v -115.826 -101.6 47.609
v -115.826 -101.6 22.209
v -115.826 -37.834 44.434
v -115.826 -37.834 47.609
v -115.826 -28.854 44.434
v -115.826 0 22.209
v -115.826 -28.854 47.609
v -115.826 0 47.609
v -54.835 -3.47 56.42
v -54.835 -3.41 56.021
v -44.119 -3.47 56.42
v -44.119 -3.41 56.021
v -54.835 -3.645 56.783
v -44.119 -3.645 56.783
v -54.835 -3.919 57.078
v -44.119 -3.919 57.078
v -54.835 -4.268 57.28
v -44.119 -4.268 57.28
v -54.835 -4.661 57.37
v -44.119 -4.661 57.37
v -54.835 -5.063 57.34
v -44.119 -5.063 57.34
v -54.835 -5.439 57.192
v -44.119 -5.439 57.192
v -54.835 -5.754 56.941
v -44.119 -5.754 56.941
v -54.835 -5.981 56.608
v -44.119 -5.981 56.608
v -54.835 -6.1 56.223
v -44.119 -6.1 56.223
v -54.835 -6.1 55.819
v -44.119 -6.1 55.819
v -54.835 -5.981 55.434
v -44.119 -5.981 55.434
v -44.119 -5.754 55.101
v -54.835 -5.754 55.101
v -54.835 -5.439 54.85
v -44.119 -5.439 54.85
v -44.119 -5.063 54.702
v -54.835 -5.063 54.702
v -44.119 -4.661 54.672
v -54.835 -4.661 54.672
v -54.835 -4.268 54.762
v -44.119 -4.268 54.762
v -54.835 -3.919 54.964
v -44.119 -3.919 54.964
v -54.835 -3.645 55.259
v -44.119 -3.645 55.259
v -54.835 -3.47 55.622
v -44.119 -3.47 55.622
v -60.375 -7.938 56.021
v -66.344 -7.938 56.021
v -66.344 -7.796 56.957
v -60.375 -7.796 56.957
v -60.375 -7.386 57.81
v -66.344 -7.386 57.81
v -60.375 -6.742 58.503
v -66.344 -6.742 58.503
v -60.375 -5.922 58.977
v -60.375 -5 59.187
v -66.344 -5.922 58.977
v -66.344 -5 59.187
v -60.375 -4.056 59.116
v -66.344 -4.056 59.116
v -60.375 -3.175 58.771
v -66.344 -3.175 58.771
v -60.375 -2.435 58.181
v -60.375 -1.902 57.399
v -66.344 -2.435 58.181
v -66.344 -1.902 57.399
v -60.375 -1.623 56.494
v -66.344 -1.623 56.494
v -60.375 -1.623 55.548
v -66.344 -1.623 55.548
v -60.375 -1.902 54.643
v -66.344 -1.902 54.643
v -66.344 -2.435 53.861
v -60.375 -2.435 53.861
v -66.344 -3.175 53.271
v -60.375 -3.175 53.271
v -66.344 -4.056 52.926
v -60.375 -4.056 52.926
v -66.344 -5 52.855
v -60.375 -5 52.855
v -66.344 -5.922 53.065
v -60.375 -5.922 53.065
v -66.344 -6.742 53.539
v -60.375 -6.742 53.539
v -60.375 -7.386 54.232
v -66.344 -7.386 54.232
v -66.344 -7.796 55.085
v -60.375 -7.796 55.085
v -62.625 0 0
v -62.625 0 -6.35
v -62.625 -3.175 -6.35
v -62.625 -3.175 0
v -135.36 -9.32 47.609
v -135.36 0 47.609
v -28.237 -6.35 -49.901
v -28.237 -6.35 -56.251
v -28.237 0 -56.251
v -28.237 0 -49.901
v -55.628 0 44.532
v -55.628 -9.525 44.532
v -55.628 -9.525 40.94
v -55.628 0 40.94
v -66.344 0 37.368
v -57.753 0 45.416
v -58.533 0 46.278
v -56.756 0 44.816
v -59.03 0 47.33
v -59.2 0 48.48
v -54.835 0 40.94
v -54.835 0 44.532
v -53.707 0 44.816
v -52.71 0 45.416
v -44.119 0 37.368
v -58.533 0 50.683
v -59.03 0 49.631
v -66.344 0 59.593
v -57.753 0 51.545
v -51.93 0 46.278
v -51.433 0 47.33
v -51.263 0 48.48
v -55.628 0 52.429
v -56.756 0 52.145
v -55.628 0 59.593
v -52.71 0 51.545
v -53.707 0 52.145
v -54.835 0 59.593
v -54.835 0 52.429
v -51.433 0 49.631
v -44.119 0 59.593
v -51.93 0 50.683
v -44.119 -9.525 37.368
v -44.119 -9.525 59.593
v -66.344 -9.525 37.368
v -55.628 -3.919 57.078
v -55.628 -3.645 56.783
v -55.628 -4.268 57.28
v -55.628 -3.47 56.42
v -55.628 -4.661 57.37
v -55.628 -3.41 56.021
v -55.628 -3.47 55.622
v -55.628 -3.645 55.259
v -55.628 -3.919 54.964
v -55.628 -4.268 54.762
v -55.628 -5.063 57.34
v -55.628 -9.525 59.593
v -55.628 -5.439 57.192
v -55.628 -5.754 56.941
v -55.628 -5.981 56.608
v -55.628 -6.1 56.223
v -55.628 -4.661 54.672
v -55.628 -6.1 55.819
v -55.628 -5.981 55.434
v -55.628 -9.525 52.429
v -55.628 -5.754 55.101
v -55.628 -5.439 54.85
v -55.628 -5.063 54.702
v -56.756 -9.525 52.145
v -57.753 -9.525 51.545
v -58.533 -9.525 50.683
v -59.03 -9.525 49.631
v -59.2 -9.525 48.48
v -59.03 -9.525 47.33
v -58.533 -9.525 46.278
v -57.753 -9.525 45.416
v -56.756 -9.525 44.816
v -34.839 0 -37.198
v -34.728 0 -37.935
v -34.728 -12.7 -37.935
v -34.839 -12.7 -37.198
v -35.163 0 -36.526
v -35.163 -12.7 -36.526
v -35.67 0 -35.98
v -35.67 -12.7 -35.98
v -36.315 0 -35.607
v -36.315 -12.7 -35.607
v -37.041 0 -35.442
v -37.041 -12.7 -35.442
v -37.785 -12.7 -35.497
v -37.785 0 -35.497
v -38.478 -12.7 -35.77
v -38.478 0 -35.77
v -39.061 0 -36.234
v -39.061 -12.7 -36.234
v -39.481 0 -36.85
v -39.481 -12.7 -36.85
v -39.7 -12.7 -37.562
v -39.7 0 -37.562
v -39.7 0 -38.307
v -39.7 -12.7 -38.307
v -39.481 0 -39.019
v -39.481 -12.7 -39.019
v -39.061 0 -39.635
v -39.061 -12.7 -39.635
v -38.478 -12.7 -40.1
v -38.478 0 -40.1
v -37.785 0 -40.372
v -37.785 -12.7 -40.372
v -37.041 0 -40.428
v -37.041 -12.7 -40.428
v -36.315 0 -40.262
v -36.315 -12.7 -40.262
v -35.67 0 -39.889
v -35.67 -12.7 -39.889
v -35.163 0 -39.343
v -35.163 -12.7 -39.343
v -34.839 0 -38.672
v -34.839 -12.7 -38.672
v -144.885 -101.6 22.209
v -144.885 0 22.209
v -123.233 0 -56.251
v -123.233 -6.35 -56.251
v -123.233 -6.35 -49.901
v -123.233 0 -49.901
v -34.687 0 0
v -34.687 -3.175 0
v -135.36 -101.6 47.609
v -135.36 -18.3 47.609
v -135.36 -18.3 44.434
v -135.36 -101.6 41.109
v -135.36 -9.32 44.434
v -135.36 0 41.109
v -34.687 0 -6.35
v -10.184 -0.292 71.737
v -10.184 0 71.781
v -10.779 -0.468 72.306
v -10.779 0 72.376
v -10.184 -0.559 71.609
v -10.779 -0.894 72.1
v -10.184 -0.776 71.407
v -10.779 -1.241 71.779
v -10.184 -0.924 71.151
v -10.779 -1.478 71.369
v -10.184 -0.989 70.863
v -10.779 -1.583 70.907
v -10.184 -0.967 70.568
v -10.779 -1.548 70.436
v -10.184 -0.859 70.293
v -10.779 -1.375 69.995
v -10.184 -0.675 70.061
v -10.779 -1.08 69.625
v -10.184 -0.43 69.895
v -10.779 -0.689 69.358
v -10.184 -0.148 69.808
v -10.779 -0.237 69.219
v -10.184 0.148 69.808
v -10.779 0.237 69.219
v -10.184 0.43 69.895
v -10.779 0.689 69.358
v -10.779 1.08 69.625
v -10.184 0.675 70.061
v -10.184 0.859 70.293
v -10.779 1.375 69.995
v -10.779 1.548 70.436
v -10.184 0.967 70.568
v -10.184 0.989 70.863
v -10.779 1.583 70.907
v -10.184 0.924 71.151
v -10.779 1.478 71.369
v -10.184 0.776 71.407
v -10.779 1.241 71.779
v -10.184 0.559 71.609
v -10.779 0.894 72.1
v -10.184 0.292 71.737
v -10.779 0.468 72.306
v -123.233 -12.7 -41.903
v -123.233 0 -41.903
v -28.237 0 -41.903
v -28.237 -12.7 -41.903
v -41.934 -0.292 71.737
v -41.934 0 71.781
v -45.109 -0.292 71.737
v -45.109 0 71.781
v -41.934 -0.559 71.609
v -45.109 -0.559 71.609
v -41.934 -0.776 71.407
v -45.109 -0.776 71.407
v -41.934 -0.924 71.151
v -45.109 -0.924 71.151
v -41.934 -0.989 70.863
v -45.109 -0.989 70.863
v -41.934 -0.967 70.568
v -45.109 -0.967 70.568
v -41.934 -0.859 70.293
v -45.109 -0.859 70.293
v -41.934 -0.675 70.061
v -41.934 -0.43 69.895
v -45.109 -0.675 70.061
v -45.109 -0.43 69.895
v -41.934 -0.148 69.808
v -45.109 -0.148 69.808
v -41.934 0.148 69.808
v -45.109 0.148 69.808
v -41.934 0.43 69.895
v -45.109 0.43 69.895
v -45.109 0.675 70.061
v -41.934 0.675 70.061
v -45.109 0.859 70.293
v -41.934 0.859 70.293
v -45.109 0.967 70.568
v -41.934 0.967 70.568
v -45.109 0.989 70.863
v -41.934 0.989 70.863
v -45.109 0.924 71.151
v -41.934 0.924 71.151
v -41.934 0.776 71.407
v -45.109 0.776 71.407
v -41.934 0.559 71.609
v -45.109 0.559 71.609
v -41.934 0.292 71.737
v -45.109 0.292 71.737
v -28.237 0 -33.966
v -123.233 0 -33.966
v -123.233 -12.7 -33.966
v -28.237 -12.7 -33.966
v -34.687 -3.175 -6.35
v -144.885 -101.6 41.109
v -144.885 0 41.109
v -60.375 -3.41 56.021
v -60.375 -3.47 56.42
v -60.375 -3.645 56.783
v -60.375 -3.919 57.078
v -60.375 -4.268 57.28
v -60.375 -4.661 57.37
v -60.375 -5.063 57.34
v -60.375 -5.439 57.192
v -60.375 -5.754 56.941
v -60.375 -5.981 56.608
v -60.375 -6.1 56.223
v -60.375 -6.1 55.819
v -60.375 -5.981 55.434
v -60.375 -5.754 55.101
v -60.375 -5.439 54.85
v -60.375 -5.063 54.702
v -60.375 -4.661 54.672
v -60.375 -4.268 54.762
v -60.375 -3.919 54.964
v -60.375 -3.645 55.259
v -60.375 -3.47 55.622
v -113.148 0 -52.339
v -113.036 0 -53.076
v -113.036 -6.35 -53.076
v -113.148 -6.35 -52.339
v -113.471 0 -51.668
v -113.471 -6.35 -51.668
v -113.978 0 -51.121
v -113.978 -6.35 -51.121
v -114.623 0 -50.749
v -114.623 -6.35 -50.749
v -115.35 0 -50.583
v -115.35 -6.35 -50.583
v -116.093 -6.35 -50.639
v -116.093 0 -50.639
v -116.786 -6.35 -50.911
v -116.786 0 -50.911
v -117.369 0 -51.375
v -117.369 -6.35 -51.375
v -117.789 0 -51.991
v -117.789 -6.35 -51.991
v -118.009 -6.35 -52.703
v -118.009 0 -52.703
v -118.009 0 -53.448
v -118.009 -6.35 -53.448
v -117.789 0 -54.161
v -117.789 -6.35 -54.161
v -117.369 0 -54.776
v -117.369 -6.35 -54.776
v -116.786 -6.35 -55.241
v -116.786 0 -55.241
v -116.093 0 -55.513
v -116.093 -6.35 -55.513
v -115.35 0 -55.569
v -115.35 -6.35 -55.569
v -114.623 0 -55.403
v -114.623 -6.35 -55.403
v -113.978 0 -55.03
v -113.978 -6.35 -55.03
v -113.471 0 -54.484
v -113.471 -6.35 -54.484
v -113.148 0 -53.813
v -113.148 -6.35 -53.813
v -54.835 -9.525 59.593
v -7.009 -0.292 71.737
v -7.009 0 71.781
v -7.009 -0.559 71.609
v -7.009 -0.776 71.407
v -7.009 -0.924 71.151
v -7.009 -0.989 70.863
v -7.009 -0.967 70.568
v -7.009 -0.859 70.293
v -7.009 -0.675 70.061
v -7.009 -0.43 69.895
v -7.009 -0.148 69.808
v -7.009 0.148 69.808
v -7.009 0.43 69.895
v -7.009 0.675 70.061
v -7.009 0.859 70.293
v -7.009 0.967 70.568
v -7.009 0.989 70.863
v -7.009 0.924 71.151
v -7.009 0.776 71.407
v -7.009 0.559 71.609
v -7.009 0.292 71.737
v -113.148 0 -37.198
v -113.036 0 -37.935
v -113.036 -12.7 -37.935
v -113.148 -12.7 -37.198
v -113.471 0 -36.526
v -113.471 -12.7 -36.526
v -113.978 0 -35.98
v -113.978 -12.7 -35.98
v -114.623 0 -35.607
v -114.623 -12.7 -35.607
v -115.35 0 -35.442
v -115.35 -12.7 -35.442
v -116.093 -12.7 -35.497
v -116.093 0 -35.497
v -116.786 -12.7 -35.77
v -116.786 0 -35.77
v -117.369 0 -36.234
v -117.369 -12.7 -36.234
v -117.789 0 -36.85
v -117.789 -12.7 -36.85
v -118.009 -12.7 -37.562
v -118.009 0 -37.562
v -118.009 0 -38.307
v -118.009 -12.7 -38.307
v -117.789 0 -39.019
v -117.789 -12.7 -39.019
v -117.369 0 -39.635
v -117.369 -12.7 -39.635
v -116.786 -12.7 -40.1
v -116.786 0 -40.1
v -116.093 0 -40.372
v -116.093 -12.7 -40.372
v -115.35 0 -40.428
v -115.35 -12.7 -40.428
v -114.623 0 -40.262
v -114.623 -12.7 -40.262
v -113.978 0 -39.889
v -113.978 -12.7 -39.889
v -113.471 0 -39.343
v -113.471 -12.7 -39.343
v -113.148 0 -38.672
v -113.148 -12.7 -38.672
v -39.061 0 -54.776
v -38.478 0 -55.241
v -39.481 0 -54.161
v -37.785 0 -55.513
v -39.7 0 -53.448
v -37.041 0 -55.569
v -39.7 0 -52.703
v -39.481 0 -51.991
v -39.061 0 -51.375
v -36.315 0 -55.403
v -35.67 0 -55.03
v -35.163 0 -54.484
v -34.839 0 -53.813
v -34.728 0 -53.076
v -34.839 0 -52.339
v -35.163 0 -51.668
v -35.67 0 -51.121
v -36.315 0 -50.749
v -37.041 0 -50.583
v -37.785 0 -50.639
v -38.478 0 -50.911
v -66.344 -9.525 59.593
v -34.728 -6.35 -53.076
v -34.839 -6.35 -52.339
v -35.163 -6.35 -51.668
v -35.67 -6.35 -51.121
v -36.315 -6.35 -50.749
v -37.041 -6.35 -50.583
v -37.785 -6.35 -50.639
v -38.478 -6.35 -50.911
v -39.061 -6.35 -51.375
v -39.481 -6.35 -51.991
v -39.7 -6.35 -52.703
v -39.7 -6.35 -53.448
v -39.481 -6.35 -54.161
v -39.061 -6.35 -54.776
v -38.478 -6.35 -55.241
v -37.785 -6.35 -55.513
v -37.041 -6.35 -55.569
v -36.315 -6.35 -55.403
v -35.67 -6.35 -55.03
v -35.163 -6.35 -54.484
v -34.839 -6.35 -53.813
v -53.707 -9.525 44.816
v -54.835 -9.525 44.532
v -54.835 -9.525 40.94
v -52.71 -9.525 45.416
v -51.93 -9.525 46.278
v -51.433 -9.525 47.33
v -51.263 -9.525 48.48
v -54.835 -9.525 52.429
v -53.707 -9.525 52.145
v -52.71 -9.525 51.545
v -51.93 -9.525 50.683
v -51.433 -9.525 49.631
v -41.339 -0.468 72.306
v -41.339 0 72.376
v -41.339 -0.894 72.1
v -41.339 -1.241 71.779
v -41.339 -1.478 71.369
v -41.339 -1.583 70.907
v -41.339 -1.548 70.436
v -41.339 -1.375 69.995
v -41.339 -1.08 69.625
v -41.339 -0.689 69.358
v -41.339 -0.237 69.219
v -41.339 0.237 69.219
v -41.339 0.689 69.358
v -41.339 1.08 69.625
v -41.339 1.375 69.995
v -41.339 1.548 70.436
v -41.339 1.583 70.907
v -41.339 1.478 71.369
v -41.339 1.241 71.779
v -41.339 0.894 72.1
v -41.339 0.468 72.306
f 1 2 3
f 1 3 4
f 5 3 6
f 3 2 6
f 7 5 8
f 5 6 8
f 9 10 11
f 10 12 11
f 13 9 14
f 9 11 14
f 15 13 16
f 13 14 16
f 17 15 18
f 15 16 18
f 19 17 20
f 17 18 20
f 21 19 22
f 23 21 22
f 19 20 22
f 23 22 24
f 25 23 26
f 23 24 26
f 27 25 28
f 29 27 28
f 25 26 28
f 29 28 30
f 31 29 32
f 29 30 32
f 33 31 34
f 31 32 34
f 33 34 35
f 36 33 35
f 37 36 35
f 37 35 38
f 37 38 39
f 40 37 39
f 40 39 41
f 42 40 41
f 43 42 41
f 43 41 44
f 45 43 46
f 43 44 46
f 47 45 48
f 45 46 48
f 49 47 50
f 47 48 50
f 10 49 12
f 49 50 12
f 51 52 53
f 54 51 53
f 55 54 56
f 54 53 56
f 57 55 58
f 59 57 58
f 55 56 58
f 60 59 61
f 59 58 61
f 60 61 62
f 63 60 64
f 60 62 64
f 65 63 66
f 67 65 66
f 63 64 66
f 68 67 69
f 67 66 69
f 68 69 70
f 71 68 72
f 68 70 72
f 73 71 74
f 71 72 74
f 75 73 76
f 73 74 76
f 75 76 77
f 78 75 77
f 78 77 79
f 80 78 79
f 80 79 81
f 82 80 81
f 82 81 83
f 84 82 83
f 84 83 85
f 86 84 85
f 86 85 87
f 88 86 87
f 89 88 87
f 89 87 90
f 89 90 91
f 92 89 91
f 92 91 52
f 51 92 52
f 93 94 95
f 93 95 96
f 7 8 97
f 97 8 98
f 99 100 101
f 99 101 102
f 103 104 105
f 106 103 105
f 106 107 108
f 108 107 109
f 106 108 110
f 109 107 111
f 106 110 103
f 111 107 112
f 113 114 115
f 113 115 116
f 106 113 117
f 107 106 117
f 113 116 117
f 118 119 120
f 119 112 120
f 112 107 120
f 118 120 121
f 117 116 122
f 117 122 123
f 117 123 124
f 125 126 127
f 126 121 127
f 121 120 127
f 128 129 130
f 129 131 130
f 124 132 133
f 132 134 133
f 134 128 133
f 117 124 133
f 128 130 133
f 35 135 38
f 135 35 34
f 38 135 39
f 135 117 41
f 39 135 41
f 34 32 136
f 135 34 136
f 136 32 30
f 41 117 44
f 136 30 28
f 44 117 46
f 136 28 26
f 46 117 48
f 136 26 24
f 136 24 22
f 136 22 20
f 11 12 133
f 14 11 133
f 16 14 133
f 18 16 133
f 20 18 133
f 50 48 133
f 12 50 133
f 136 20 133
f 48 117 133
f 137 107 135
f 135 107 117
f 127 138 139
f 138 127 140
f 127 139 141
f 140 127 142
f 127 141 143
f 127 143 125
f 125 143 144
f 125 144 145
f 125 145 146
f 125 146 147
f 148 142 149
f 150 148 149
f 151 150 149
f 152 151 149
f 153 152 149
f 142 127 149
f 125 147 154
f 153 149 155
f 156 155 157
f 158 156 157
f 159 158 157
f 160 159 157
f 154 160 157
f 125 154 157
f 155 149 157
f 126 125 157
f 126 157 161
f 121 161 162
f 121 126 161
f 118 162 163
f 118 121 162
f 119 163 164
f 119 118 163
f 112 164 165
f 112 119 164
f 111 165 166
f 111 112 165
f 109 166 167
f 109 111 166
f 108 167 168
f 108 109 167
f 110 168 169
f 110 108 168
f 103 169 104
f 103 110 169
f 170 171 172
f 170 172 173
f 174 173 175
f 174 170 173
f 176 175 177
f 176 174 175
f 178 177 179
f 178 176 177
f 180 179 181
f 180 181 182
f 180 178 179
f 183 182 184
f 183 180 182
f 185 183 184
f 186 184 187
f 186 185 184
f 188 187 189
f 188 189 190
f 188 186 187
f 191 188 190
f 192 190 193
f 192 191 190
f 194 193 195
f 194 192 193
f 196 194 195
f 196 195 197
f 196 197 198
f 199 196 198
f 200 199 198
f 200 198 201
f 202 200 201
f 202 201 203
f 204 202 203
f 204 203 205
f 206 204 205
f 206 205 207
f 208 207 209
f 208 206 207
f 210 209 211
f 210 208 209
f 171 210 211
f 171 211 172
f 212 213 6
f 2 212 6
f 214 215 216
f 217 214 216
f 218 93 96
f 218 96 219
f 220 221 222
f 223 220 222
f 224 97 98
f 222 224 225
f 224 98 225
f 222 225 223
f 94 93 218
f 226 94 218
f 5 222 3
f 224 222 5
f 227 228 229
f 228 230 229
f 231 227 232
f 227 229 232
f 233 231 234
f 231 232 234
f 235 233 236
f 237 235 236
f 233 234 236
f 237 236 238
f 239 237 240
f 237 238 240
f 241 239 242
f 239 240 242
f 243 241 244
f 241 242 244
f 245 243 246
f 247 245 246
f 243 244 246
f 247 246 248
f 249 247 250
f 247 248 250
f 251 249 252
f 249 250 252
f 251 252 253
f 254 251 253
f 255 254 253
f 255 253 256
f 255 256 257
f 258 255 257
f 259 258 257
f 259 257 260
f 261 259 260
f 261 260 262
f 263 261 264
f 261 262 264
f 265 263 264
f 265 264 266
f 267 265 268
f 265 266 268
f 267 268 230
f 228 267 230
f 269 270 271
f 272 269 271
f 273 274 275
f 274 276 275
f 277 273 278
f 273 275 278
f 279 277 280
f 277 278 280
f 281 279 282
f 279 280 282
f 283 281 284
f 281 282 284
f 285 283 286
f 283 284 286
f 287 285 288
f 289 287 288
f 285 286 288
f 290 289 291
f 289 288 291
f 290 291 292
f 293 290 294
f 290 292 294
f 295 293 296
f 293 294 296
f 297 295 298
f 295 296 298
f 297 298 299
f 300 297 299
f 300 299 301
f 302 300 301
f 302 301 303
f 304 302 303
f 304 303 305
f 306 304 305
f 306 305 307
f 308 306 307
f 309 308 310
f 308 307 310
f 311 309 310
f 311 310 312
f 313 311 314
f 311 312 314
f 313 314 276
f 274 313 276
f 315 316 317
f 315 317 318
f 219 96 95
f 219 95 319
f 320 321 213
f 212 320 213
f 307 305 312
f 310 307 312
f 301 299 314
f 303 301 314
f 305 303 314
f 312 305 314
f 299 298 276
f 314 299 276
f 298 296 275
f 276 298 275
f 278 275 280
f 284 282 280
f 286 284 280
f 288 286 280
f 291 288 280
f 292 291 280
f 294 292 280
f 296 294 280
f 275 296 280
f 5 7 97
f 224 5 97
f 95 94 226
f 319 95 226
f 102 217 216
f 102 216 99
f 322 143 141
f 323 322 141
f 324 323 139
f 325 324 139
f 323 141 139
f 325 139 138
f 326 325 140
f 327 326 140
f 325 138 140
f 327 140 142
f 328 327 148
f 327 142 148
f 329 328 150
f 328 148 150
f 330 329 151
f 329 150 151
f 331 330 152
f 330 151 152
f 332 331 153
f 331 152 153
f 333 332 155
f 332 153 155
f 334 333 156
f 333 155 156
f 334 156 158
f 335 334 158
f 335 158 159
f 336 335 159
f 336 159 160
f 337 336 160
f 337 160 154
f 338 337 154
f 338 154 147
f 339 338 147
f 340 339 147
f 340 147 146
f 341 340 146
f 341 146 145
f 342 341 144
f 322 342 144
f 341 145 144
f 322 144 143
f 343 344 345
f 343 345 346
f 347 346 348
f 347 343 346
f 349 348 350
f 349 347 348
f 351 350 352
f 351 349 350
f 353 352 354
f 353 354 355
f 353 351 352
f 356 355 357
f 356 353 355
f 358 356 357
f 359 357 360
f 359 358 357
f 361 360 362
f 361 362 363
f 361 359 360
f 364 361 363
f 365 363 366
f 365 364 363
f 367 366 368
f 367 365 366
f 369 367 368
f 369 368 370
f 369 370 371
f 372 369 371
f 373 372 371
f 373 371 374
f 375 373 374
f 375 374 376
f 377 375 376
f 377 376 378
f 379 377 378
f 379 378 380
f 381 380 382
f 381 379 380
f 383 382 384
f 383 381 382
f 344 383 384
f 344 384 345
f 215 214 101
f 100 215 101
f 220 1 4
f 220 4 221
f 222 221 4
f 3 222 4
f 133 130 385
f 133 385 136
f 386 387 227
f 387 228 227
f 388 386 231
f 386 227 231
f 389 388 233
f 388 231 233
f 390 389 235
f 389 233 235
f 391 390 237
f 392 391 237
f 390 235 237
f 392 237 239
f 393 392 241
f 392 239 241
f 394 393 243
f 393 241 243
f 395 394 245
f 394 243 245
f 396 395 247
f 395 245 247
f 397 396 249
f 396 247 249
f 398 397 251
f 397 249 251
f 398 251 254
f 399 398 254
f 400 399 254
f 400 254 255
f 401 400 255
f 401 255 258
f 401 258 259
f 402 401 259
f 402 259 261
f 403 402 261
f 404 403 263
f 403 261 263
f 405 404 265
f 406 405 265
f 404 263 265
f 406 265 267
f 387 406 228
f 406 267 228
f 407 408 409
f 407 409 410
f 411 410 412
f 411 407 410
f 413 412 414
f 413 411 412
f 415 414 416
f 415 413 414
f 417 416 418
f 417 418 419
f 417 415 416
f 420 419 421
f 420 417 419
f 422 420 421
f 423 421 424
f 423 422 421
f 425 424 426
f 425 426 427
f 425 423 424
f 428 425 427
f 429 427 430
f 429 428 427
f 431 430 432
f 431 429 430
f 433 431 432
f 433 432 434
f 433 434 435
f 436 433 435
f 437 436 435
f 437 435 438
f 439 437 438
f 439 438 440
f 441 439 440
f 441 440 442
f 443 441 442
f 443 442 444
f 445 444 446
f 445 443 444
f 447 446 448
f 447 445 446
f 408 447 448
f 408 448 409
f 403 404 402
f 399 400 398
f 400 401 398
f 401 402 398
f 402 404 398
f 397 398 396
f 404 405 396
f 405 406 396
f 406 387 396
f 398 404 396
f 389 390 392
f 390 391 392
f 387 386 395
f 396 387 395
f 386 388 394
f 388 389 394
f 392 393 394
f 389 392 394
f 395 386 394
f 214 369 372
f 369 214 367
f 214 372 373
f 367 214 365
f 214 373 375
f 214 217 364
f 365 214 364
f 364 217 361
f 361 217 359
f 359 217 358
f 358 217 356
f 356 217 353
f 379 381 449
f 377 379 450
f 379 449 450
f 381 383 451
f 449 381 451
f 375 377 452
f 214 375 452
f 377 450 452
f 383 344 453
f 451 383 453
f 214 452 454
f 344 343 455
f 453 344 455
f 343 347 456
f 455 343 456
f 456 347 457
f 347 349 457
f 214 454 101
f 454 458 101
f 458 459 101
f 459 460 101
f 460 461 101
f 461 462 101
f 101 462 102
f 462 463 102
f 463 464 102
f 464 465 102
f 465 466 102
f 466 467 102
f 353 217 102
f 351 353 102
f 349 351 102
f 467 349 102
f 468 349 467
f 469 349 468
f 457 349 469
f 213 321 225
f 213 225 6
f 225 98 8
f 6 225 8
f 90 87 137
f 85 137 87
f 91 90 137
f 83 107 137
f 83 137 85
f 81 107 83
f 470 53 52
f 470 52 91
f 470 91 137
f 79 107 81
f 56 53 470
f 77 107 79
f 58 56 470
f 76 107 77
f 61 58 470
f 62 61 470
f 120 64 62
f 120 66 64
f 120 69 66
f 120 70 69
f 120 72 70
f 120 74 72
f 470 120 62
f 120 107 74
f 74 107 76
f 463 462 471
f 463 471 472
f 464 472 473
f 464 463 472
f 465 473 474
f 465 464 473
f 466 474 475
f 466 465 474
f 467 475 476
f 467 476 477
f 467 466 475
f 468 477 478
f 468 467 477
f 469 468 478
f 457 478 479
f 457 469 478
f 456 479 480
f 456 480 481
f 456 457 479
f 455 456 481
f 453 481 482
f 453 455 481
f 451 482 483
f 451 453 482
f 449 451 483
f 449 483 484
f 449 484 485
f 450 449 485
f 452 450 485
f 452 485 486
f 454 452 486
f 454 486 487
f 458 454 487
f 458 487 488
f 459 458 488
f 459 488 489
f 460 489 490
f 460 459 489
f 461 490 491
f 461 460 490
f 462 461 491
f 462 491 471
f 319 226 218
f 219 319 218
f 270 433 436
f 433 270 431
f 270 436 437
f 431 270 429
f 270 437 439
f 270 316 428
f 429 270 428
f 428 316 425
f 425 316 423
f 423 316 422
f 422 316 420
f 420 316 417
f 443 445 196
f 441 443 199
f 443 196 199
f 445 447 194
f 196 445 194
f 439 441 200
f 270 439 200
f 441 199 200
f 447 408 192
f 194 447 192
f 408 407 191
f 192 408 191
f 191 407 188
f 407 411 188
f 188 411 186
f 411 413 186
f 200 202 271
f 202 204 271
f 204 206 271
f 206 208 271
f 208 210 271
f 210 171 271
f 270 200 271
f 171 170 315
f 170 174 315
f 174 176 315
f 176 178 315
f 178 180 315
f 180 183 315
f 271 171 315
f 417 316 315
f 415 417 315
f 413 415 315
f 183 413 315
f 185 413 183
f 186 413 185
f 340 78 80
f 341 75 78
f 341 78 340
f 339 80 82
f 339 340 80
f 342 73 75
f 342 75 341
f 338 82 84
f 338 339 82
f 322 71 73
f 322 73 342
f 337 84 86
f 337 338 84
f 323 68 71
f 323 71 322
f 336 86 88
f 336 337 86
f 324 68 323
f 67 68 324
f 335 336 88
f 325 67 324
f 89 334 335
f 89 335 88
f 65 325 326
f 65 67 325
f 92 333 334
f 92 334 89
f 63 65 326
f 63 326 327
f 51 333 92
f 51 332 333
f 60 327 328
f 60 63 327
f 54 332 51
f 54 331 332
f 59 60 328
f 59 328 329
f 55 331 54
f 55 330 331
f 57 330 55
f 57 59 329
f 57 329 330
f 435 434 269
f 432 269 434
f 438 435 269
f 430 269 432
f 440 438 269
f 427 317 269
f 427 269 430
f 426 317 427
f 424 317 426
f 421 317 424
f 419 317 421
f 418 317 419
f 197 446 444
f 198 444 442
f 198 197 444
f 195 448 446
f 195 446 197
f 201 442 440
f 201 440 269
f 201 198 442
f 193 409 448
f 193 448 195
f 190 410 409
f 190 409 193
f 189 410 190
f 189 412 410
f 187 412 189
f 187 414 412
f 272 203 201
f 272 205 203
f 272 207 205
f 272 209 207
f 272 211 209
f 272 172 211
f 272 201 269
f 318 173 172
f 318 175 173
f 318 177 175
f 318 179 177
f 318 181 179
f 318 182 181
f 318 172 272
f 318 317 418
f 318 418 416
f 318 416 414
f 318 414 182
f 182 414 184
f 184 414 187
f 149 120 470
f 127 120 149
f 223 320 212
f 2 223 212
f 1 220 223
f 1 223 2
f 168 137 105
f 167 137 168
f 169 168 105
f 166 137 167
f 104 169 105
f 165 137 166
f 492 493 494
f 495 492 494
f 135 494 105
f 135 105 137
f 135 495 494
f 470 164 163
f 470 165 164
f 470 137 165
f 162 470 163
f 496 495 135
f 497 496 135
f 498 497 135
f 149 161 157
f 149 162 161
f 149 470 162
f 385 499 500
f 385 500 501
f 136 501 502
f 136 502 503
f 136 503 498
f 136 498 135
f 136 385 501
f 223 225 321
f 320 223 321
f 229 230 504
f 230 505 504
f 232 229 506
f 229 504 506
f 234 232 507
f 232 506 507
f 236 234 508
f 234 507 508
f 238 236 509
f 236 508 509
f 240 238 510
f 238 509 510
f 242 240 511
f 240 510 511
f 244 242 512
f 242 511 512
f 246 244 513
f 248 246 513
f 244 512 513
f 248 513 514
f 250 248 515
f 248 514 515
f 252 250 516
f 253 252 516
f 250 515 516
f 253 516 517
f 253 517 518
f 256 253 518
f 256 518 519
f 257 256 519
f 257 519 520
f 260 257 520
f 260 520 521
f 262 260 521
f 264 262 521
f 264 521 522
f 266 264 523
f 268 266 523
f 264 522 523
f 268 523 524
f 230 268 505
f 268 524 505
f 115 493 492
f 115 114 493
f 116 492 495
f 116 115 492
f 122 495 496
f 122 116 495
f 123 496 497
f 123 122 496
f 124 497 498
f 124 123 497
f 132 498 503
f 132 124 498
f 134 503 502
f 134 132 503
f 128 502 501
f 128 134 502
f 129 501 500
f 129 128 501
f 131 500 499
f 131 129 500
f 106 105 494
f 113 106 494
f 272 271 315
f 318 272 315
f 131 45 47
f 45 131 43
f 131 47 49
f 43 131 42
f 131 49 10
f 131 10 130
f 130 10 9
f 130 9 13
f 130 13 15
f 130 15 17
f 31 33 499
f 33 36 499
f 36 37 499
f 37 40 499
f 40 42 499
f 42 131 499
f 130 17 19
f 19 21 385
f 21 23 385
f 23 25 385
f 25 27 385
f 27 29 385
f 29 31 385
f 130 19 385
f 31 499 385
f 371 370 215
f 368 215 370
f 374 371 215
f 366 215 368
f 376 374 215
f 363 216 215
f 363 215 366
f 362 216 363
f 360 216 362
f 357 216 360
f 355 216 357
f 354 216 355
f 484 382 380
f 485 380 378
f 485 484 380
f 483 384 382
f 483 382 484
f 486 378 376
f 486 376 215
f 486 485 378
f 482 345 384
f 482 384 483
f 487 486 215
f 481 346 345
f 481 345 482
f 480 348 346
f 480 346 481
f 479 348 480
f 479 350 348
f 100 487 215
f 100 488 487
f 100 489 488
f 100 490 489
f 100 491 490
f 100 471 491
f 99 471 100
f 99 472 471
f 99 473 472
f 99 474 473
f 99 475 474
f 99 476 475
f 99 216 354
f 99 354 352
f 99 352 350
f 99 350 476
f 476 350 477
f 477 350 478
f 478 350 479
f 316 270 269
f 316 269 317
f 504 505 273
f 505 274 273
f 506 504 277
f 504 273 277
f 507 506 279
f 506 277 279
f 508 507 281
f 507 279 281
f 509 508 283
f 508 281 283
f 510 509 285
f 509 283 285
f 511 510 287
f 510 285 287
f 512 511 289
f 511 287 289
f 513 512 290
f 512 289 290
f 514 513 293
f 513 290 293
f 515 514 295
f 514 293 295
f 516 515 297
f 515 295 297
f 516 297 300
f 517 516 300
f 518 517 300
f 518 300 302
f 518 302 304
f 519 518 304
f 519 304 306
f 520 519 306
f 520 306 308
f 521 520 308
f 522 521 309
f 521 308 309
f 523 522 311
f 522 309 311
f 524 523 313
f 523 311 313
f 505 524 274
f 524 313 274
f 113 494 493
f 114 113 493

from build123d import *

# Parameters (mm, degrees)
F0_W           = 22.225
F0_H           = 22.225
F0_R           = 3.96875
F1_DEPTH       = 9.525
F3_D           = 2.7051
F3_CBORE_D     = 6.35
F3_CBORE_DEPTH = 5.969
F5_DEPTH       = 25.4
F8_W           = 94.996
F8_H           = 7.9375
F8_R           = 2.5
F9_DEPTH       = 12.7
F10_W          = 94.996
F10_H          = 6.35
F10_R          = 2.5
F11_DEPTH      = 6.35
F12_W          = 27.9375
F12_H          = 6.35
F13_DEPTH      = 3.175
F15_DEPTH      = 101.6
F17_DEPTH      = 3.175


with BuildPart() as f1:
    # F0 (on Front) → F1 (new body)
    with BuildSketch(Plane.XZ):
        with Locations((-55.231563729, 48.4803952456)):
            Rectangle(F0_W, F0_H)
        with Locations((-55.231563729, 48.4803952456)):
            Circle(F0_R, mode=Mode.SUBTRACT)
    extrude(amount=F1_DEPTH)

    # F3 (through all)
    with Locations(Plane(origin=(-66.344063729, 0, 0), x_dir=(0, -1, 0), z_dir=(-1, 0, 0))):
        with Locations((4.7625, 56.0210202456)):
            CounterBoreHole(F3_D / 2, F3_CBORE_D / 2, F3_CBORE_DEPTH)

    # F4 (on face) → F5 (cut)
    with BuildSketch(Plane.XZ.offset(9.525)):
        with BuildLine():
            Line((-54.834688729, 52.4292516366), (-54.834688729, 59.5928952456))
            Line((-54.834688729, 59.5928952456), (-55.628438729, 59.5928952456))
            Line((-55.628438729, 59.5928952456), (-55.628438729, 52.4292516366))
            ThreePointArc((-55.628438729, 52.4292516366), (-55.231563729, 52.4491452456), (-54.834688729, 52.4292516366))
        make_face()
        with BuildLine():
            Line((-54.834688729, 40.9397702456), (-54.834688729, 44.5315388545))
            ThreePointArc((-54.834688729, 44.5315388545), (-55.231563729, 44.5116452456), (-55.628438729, 44.5315388545))
            Line((-55.628438729, 44.5315388545), (-55.628438729, 40.9397702456))
            Line((-55.628438729, 40.9397702456), (-54.834688729, 40.9397702456))
        make_face()
    extrude(amount=-F5_DEPTH, mode=Mode.SUBTRACT)


with BuildPart() as f7:
    # F6 (on Front) → F7 (revolve)
    with BuildSketch(Plane.XZ):
        Polygon((-45.1088624105, 71.7809695899), (-45.1088624105, 70.7887820899), (-7.0088624105, 70.7887820899), (-7.0088624105, 71.7809695899), (-10.1838624105, 71.7809695899), (-10.7791749105, 72.3762820899), (-41.3385499105, 72.3762820899), (-41.9338624105, 71.7809695899), align=None)
    revolve(axis=Axis((-26.0588624105, 0, 70.7887820899), (1, 0, 0)))


with BuildPart() as f9:
    # F8 (on Front) → F9 (new body)
    with BuildSketch(Plane.XZ):
        with Locations((-75.7346581668, -37.9346387305)):
            Rectangle(F8_W, F8_H)
        with Locations((-115.5364581668, -37.9346387305)):
            Circle(F8_R, mode=Mode.SUBTRACT)
        with Locations((-37.2282581668, -37.9346387305)):
            Circle(F8_R, mode=Mode.SUBTRACT)
    extrude(amount=F9_DEPTH)


with BuildPart() as f11:
    # F10 (on Front) → F11 (new body)
    with BuildSketch(Plane.XZ):
        with Locations((-75.7346581668, -53.075885129)):
            Rectangle(F10_W, F10_H)
        with Locations((-115.5364581668, -53.075885129)):
            Circle(F10_R, mode=Mode.SUBTRACT)
        with Locations((-37.2282581668, -53.075885129)):
            Circle(F10_R, mode=Mode.SUBTRACT)
    extrude(amount=F11_DEPTH)


with BuildPart() as f13:
    # F12 (on Front) → F13 (new body)
    with BuildSketch(Plane.XZ):
        with Locations((-48.6561949255, -3.175)):
            Rectangle(F12_W, F12_H)
    extrude(amount=F13_DEPTH)


with BuildPart() as f15:
    # F14 (on Front) → F15 (new body)
    with BuildSketch(Plane.XZ):
        Polygon((-115.82578916, 47.6090334209), (-135.3601208026, 47.6090334209), (-135.3601208026, 41.1090334209), (-144.8851208026, 41.1090334209), (-144.8851208026, 22.2090334209), (-115.82578916, 22.2090334209), align=None)
    extrude(amount=F15_DEPTH)

    # F16 (on face) → F17 (cut)
    with BuildSketch(Plane.XY.offset(47.6090334209)):
        Polygon((-135.3601208026, -9.3197438789), (-135.3601208026, -18.3), (-115.82578916, -37.8343316426), (-115.82578916, -28.8540755215), align=None)
    extrude(amount=-F17_DEPTH, mode=Mode.SUBTRACT)


solid = Compound([f1.part, f7.part, f9.part, f11.part, f13.part, f15.part])
